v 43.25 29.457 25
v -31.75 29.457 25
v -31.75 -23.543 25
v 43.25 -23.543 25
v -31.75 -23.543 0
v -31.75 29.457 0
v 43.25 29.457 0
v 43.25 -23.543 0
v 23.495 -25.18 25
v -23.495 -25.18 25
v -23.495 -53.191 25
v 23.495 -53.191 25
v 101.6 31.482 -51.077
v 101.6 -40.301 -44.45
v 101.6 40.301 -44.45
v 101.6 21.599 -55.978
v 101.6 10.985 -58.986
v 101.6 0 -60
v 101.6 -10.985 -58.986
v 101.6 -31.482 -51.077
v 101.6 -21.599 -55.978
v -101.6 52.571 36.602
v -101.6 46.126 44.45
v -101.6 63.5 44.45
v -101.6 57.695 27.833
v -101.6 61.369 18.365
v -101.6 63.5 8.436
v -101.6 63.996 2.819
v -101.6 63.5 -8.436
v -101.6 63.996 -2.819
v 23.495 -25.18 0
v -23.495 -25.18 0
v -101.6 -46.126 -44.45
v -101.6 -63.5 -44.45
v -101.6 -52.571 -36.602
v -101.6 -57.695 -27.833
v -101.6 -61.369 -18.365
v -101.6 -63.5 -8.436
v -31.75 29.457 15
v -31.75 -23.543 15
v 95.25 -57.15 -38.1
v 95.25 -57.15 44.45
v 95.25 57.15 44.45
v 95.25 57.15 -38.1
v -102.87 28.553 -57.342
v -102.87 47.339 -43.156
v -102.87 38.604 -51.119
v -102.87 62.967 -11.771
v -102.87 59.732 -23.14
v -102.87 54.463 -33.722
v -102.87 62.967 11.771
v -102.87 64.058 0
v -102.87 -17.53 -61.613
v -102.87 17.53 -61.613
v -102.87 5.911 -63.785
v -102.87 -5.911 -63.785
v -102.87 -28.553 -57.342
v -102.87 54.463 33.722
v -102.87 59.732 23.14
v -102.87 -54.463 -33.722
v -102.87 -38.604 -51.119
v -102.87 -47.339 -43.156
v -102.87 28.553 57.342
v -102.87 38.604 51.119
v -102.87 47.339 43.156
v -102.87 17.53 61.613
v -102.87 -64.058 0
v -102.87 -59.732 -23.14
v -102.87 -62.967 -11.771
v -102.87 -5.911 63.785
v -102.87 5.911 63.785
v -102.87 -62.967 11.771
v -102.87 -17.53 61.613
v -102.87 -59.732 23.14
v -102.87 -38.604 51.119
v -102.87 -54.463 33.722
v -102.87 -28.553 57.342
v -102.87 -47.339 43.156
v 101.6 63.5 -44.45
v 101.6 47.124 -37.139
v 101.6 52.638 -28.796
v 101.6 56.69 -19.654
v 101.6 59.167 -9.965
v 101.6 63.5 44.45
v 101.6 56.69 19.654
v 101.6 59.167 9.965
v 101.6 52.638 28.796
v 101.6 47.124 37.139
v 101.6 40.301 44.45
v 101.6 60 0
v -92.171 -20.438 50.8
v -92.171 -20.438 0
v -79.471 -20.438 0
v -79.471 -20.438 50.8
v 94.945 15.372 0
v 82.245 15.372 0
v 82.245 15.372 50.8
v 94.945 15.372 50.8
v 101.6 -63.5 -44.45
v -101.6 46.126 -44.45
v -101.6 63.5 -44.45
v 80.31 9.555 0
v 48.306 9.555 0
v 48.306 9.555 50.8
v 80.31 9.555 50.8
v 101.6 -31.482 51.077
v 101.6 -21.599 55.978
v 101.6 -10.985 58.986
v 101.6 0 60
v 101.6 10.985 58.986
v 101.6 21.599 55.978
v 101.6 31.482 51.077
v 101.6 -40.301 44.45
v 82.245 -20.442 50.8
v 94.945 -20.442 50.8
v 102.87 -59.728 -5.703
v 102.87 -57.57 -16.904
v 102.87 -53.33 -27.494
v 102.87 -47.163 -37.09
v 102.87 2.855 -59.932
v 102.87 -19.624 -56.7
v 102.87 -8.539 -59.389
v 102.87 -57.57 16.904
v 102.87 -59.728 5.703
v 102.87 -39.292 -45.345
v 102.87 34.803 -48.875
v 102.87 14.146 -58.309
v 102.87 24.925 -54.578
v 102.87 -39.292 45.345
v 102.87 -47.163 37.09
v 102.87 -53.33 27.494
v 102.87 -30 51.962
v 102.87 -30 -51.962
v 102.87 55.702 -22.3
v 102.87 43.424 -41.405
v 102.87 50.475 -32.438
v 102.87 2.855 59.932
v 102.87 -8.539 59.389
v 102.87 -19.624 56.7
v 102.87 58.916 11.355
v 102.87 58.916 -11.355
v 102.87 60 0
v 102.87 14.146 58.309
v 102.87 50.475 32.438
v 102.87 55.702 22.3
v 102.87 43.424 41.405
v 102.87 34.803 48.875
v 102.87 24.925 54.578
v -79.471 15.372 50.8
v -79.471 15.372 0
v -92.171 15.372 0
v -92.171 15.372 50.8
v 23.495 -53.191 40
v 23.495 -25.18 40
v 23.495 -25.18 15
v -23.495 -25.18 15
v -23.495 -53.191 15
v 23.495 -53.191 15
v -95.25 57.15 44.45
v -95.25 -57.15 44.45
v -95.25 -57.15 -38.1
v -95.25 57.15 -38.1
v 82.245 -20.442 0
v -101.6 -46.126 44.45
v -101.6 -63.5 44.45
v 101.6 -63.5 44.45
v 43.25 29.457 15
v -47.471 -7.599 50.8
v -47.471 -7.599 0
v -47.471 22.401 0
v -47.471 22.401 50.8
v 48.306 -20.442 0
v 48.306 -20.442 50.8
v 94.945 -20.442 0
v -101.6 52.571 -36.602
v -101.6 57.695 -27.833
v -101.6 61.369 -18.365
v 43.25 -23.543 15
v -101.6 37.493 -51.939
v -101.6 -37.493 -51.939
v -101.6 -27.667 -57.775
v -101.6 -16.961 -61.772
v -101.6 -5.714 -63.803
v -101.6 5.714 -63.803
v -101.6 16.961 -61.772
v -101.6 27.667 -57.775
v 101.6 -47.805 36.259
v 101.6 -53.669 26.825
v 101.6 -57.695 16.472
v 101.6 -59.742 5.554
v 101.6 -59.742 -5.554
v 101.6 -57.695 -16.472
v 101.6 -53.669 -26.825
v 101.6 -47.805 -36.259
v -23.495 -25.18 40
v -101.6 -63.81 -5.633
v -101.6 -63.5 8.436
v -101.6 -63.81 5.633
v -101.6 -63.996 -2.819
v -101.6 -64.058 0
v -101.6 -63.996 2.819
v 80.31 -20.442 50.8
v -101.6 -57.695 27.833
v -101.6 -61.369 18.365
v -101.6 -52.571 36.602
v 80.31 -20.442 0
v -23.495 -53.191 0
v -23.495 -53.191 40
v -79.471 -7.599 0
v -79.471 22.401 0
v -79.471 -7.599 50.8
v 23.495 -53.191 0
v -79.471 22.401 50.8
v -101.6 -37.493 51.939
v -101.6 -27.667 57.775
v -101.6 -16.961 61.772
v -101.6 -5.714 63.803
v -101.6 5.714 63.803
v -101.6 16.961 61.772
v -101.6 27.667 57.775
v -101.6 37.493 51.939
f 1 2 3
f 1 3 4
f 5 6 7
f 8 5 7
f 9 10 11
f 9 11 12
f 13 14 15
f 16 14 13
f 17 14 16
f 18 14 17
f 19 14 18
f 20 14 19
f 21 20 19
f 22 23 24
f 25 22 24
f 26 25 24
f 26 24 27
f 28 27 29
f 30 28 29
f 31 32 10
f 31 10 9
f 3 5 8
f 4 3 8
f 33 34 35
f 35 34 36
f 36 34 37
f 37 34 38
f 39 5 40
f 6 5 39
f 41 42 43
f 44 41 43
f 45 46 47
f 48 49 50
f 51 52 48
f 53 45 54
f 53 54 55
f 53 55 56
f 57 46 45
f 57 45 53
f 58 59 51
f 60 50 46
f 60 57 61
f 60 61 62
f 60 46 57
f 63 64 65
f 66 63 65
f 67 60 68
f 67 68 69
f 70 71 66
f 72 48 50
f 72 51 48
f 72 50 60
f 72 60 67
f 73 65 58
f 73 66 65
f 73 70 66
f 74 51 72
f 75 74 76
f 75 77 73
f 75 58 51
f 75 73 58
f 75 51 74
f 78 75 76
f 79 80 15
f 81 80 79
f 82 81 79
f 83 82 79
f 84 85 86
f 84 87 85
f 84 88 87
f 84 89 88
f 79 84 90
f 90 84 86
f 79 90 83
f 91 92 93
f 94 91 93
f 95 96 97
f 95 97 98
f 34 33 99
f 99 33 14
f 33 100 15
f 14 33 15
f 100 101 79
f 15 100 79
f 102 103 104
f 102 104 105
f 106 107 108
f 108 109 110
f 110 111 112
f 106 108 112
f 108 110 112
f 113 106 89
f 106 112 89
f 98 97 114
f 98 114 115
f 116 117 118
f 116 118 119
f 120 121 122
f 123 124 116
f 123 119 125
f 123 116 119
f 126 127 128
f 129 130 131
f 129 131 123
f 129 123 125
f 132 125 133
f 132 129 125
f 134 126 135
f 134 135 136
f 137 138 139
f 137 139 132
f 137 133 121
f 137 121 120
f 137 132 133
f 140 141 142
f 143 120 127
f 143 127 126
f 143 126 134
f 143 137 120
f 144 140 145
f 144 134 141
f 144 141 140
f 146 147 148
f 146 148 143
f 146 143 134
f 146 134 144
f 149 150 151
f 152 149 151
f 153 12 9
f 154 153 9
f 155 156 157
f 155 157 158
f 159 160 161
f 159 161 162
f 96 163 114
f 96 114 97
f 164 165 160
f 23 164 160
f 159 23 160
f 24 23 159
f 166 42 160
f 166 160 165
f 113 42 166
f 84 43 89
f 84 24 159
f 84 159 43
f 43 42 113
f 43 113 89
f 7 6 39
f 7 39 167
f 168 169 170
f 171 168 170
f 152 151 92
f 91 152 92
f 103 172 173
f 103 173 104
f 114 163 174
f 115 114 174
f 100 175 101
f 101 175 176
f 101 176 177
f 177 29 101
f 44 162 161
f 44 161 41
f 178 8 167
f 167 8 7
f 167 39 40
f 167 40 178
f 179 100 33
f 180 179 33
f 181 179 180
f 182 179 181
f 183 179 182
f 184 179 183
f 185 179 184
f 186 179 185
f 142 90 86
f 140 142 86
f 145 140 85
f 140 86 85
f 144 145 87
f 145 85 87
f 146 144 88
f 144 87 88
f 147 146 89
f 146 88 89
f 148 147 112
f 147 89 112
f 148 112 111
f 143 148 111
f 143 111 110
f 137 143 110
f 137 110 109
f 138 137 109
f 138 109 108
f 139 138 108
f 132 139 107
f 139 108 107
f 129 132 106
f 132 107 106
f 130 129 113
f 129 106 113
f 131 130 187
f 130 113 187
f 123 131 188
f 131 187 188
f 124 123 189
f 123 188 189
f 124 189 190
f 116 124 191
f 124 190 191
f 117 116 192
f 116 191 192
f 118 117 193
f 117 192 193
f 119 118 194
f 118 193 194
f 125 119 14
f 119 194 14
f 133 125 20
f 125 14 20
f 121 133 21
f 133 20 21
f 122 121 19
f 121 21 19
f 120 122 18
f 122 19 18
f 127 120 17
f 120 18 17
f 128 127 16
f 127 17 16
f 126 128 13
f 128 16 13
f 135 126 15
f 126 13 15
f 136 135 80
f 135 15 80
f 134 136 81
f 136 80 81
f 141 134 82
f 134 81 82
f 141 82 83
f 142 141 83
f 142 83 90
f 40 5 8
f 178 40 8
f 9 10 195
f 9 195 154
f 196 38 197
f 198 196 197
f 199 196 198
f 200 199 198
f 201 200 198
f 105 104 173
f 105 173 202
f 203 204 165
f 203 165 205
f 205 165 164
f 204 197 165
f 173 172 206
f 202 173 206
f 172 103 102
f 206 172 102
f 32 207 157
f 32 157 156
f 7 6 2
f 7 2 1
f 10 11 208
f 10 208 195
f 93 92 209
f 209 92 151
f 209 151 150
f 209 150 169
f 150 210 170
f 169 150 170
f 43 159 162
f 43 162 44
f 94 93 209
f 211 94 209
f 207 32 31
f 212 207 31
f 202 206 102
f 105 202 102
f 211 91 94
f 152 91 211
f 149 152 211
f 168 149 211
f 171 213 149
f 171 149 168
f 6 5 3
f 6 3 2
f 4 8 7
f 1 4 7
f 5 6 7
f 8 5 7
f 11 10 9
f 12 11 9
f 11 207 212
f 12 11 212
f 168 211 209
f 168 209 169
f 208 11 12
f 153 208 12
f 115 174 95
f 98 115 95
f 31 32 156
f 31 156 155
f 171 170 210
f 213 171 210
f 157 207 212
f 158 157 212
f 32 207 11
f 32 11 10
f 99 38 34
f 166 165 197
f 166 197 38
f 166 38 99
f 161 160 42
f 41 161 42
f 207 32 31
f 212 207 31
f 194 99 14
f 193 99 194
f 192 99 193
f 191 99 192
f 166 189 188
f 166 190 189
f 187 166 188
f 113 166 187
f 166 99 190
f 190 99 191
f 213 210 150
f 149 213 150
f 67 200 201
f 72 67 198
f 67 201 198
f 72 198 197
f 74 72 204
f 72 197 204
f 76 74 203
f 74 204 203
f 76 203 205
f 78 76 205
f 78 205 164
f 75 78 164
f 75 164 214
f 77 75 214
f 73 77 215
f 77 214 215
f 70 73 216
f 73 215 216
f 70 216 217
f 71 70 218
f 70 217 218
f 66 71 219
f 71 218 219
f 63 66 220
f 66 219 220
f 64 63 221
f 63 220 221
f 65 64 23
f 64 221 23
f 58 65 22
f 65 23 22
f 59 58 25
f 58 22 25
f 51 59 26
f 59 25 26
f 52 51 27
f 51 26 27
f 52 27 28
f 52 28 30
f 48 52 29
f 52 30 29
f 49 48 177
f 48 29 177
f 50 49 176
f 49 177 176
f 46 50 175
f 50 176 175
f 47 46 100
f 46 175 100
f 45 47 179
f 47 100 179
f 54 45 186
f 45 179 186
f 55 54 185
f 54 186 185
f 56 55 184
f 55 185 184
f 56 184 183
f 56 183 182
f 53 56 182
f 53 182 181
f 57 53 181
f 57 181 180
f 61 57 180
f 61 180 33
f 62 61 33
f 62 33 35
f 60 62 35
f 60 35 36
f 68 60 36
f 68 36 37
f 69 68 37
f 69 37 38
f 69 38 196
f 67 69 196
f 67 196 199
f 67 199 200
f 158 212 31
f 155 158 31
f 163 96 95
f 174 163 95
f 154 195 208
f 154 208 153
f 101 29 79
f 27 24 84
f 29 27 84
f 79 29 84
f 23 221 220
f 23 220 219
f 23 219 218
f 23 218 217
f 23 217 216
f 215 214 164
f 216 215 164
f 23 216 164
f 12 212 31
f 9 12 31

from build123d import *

# Parameters (mm, degrees)
F0_W      = 203.2
F0_H      = 127
F1_DEPTH  = 44.45
F2_T      = -6.35
F3_W      = 75
F3_H      = 53
F3_W_2    = 46.99
F3_H_2    = 28.010949
F4_DEPTH  = 25
F6_R      = 60
F7_DEPTH  = 1.27
F9_R      = 64.05789
F10_DEPTH = 1.27
F4_FACE_W = 46.99
F4_FACE_H = 28.01095
F11_DEPTH = 15
F12_W     = 12.7
F12_H     = 35.814
F12_W_2   = 32.004
F12_H_2   = 29.9974
F13_DEPTH = 50.8


with BuildPart() as f1:
    # F0 (on Top) → F1 (new body, symmetric)
    with BuildSketch(Plane.XY):
        Rectangle(F0_W, F0_H)
    extrude(amount=F1_DEPTH, both=True)

    # F2
    f2_openings = [f1.faces().sort_by_distance(p)[0] for p in [
        (0, 0, 44.45),
    ]]
    offset(amount=F2_T, openings=f2_openings)

    # F6 (on offset) → F7 (join)
    with BuildSketch(Plane.YZ.offset(101.6)):
        Circle(F6_R)
    extrude(amount=F7_DEPTH)

    # F9 (on offset) → F10 (join)
    with BuildSketch(Plane(origin=(-101.6, 0, 0), x_dir=(0, -1, 0), z_dir=(-1, 0, 0))):
        Circle(F9_R)
    extrude(amount=F10_DEPTH)


with BuildPart() as f4:
    # F3 (on Top) → F4 (new body)
    with BuildSketch(Plane.XY):
        with Locations((5.75, 2.956568)):
            Rectangle(F3_W, F3_H)
        with Locations((0, -39.185531)):
            Rectangle(F3_W_2, F3_H_2)
    extrude(amount=F4_DEPTH)


with BuildPart() as f11:
    # F3 (on Top) + F4_face (on face) → F11 (new body)
    with BuildSketch(Plane.XY):
        with Locations((5.75, 2.956568)):
            Rectangle(F3_W, F3_H)
        with Locations((0, -39.185531)):
            Rectangle(F3_W_2, F3_H_2)
    with BuildSketch(Plane(origin=(0, -39.185531, 25), x_dir=(1, 0, 0), z_dir=(0, 0, 1))):
        Rectangle(F4_FACE_W, F4_FACE_H)
    extrude(amount=F11_DEPTH)


with BuildPart() as f13:
    # F12 (on Top) → F13 (new body)
    with BuildSketch(Plane.XY):
        Polygon((-79.470783, 15.372009), (-92.170783, 15.372009), (-92.170783, -20.437819), (-79.470783, -20.437819), (-79.470783, -7.598715), align=None)
        Polygon((-79.470783, 22.401285), (-79.470783, 15.372009), (-79.470783, -7.598715), (-47.470783, -7.598715), (-47.470783, 22.401285), align=None)
        with Locations((88.594918, -2.534991)):
            Rectangle(F12_W, F12_H)
        with Locations((64.308115, -5.443291)):
            Rectangle(F12_W_2, F12_H_2)
    extrude(amount=F13_DEPTH)


solid = Compound([f1.part, f4.part, f11.part, f13.part])
